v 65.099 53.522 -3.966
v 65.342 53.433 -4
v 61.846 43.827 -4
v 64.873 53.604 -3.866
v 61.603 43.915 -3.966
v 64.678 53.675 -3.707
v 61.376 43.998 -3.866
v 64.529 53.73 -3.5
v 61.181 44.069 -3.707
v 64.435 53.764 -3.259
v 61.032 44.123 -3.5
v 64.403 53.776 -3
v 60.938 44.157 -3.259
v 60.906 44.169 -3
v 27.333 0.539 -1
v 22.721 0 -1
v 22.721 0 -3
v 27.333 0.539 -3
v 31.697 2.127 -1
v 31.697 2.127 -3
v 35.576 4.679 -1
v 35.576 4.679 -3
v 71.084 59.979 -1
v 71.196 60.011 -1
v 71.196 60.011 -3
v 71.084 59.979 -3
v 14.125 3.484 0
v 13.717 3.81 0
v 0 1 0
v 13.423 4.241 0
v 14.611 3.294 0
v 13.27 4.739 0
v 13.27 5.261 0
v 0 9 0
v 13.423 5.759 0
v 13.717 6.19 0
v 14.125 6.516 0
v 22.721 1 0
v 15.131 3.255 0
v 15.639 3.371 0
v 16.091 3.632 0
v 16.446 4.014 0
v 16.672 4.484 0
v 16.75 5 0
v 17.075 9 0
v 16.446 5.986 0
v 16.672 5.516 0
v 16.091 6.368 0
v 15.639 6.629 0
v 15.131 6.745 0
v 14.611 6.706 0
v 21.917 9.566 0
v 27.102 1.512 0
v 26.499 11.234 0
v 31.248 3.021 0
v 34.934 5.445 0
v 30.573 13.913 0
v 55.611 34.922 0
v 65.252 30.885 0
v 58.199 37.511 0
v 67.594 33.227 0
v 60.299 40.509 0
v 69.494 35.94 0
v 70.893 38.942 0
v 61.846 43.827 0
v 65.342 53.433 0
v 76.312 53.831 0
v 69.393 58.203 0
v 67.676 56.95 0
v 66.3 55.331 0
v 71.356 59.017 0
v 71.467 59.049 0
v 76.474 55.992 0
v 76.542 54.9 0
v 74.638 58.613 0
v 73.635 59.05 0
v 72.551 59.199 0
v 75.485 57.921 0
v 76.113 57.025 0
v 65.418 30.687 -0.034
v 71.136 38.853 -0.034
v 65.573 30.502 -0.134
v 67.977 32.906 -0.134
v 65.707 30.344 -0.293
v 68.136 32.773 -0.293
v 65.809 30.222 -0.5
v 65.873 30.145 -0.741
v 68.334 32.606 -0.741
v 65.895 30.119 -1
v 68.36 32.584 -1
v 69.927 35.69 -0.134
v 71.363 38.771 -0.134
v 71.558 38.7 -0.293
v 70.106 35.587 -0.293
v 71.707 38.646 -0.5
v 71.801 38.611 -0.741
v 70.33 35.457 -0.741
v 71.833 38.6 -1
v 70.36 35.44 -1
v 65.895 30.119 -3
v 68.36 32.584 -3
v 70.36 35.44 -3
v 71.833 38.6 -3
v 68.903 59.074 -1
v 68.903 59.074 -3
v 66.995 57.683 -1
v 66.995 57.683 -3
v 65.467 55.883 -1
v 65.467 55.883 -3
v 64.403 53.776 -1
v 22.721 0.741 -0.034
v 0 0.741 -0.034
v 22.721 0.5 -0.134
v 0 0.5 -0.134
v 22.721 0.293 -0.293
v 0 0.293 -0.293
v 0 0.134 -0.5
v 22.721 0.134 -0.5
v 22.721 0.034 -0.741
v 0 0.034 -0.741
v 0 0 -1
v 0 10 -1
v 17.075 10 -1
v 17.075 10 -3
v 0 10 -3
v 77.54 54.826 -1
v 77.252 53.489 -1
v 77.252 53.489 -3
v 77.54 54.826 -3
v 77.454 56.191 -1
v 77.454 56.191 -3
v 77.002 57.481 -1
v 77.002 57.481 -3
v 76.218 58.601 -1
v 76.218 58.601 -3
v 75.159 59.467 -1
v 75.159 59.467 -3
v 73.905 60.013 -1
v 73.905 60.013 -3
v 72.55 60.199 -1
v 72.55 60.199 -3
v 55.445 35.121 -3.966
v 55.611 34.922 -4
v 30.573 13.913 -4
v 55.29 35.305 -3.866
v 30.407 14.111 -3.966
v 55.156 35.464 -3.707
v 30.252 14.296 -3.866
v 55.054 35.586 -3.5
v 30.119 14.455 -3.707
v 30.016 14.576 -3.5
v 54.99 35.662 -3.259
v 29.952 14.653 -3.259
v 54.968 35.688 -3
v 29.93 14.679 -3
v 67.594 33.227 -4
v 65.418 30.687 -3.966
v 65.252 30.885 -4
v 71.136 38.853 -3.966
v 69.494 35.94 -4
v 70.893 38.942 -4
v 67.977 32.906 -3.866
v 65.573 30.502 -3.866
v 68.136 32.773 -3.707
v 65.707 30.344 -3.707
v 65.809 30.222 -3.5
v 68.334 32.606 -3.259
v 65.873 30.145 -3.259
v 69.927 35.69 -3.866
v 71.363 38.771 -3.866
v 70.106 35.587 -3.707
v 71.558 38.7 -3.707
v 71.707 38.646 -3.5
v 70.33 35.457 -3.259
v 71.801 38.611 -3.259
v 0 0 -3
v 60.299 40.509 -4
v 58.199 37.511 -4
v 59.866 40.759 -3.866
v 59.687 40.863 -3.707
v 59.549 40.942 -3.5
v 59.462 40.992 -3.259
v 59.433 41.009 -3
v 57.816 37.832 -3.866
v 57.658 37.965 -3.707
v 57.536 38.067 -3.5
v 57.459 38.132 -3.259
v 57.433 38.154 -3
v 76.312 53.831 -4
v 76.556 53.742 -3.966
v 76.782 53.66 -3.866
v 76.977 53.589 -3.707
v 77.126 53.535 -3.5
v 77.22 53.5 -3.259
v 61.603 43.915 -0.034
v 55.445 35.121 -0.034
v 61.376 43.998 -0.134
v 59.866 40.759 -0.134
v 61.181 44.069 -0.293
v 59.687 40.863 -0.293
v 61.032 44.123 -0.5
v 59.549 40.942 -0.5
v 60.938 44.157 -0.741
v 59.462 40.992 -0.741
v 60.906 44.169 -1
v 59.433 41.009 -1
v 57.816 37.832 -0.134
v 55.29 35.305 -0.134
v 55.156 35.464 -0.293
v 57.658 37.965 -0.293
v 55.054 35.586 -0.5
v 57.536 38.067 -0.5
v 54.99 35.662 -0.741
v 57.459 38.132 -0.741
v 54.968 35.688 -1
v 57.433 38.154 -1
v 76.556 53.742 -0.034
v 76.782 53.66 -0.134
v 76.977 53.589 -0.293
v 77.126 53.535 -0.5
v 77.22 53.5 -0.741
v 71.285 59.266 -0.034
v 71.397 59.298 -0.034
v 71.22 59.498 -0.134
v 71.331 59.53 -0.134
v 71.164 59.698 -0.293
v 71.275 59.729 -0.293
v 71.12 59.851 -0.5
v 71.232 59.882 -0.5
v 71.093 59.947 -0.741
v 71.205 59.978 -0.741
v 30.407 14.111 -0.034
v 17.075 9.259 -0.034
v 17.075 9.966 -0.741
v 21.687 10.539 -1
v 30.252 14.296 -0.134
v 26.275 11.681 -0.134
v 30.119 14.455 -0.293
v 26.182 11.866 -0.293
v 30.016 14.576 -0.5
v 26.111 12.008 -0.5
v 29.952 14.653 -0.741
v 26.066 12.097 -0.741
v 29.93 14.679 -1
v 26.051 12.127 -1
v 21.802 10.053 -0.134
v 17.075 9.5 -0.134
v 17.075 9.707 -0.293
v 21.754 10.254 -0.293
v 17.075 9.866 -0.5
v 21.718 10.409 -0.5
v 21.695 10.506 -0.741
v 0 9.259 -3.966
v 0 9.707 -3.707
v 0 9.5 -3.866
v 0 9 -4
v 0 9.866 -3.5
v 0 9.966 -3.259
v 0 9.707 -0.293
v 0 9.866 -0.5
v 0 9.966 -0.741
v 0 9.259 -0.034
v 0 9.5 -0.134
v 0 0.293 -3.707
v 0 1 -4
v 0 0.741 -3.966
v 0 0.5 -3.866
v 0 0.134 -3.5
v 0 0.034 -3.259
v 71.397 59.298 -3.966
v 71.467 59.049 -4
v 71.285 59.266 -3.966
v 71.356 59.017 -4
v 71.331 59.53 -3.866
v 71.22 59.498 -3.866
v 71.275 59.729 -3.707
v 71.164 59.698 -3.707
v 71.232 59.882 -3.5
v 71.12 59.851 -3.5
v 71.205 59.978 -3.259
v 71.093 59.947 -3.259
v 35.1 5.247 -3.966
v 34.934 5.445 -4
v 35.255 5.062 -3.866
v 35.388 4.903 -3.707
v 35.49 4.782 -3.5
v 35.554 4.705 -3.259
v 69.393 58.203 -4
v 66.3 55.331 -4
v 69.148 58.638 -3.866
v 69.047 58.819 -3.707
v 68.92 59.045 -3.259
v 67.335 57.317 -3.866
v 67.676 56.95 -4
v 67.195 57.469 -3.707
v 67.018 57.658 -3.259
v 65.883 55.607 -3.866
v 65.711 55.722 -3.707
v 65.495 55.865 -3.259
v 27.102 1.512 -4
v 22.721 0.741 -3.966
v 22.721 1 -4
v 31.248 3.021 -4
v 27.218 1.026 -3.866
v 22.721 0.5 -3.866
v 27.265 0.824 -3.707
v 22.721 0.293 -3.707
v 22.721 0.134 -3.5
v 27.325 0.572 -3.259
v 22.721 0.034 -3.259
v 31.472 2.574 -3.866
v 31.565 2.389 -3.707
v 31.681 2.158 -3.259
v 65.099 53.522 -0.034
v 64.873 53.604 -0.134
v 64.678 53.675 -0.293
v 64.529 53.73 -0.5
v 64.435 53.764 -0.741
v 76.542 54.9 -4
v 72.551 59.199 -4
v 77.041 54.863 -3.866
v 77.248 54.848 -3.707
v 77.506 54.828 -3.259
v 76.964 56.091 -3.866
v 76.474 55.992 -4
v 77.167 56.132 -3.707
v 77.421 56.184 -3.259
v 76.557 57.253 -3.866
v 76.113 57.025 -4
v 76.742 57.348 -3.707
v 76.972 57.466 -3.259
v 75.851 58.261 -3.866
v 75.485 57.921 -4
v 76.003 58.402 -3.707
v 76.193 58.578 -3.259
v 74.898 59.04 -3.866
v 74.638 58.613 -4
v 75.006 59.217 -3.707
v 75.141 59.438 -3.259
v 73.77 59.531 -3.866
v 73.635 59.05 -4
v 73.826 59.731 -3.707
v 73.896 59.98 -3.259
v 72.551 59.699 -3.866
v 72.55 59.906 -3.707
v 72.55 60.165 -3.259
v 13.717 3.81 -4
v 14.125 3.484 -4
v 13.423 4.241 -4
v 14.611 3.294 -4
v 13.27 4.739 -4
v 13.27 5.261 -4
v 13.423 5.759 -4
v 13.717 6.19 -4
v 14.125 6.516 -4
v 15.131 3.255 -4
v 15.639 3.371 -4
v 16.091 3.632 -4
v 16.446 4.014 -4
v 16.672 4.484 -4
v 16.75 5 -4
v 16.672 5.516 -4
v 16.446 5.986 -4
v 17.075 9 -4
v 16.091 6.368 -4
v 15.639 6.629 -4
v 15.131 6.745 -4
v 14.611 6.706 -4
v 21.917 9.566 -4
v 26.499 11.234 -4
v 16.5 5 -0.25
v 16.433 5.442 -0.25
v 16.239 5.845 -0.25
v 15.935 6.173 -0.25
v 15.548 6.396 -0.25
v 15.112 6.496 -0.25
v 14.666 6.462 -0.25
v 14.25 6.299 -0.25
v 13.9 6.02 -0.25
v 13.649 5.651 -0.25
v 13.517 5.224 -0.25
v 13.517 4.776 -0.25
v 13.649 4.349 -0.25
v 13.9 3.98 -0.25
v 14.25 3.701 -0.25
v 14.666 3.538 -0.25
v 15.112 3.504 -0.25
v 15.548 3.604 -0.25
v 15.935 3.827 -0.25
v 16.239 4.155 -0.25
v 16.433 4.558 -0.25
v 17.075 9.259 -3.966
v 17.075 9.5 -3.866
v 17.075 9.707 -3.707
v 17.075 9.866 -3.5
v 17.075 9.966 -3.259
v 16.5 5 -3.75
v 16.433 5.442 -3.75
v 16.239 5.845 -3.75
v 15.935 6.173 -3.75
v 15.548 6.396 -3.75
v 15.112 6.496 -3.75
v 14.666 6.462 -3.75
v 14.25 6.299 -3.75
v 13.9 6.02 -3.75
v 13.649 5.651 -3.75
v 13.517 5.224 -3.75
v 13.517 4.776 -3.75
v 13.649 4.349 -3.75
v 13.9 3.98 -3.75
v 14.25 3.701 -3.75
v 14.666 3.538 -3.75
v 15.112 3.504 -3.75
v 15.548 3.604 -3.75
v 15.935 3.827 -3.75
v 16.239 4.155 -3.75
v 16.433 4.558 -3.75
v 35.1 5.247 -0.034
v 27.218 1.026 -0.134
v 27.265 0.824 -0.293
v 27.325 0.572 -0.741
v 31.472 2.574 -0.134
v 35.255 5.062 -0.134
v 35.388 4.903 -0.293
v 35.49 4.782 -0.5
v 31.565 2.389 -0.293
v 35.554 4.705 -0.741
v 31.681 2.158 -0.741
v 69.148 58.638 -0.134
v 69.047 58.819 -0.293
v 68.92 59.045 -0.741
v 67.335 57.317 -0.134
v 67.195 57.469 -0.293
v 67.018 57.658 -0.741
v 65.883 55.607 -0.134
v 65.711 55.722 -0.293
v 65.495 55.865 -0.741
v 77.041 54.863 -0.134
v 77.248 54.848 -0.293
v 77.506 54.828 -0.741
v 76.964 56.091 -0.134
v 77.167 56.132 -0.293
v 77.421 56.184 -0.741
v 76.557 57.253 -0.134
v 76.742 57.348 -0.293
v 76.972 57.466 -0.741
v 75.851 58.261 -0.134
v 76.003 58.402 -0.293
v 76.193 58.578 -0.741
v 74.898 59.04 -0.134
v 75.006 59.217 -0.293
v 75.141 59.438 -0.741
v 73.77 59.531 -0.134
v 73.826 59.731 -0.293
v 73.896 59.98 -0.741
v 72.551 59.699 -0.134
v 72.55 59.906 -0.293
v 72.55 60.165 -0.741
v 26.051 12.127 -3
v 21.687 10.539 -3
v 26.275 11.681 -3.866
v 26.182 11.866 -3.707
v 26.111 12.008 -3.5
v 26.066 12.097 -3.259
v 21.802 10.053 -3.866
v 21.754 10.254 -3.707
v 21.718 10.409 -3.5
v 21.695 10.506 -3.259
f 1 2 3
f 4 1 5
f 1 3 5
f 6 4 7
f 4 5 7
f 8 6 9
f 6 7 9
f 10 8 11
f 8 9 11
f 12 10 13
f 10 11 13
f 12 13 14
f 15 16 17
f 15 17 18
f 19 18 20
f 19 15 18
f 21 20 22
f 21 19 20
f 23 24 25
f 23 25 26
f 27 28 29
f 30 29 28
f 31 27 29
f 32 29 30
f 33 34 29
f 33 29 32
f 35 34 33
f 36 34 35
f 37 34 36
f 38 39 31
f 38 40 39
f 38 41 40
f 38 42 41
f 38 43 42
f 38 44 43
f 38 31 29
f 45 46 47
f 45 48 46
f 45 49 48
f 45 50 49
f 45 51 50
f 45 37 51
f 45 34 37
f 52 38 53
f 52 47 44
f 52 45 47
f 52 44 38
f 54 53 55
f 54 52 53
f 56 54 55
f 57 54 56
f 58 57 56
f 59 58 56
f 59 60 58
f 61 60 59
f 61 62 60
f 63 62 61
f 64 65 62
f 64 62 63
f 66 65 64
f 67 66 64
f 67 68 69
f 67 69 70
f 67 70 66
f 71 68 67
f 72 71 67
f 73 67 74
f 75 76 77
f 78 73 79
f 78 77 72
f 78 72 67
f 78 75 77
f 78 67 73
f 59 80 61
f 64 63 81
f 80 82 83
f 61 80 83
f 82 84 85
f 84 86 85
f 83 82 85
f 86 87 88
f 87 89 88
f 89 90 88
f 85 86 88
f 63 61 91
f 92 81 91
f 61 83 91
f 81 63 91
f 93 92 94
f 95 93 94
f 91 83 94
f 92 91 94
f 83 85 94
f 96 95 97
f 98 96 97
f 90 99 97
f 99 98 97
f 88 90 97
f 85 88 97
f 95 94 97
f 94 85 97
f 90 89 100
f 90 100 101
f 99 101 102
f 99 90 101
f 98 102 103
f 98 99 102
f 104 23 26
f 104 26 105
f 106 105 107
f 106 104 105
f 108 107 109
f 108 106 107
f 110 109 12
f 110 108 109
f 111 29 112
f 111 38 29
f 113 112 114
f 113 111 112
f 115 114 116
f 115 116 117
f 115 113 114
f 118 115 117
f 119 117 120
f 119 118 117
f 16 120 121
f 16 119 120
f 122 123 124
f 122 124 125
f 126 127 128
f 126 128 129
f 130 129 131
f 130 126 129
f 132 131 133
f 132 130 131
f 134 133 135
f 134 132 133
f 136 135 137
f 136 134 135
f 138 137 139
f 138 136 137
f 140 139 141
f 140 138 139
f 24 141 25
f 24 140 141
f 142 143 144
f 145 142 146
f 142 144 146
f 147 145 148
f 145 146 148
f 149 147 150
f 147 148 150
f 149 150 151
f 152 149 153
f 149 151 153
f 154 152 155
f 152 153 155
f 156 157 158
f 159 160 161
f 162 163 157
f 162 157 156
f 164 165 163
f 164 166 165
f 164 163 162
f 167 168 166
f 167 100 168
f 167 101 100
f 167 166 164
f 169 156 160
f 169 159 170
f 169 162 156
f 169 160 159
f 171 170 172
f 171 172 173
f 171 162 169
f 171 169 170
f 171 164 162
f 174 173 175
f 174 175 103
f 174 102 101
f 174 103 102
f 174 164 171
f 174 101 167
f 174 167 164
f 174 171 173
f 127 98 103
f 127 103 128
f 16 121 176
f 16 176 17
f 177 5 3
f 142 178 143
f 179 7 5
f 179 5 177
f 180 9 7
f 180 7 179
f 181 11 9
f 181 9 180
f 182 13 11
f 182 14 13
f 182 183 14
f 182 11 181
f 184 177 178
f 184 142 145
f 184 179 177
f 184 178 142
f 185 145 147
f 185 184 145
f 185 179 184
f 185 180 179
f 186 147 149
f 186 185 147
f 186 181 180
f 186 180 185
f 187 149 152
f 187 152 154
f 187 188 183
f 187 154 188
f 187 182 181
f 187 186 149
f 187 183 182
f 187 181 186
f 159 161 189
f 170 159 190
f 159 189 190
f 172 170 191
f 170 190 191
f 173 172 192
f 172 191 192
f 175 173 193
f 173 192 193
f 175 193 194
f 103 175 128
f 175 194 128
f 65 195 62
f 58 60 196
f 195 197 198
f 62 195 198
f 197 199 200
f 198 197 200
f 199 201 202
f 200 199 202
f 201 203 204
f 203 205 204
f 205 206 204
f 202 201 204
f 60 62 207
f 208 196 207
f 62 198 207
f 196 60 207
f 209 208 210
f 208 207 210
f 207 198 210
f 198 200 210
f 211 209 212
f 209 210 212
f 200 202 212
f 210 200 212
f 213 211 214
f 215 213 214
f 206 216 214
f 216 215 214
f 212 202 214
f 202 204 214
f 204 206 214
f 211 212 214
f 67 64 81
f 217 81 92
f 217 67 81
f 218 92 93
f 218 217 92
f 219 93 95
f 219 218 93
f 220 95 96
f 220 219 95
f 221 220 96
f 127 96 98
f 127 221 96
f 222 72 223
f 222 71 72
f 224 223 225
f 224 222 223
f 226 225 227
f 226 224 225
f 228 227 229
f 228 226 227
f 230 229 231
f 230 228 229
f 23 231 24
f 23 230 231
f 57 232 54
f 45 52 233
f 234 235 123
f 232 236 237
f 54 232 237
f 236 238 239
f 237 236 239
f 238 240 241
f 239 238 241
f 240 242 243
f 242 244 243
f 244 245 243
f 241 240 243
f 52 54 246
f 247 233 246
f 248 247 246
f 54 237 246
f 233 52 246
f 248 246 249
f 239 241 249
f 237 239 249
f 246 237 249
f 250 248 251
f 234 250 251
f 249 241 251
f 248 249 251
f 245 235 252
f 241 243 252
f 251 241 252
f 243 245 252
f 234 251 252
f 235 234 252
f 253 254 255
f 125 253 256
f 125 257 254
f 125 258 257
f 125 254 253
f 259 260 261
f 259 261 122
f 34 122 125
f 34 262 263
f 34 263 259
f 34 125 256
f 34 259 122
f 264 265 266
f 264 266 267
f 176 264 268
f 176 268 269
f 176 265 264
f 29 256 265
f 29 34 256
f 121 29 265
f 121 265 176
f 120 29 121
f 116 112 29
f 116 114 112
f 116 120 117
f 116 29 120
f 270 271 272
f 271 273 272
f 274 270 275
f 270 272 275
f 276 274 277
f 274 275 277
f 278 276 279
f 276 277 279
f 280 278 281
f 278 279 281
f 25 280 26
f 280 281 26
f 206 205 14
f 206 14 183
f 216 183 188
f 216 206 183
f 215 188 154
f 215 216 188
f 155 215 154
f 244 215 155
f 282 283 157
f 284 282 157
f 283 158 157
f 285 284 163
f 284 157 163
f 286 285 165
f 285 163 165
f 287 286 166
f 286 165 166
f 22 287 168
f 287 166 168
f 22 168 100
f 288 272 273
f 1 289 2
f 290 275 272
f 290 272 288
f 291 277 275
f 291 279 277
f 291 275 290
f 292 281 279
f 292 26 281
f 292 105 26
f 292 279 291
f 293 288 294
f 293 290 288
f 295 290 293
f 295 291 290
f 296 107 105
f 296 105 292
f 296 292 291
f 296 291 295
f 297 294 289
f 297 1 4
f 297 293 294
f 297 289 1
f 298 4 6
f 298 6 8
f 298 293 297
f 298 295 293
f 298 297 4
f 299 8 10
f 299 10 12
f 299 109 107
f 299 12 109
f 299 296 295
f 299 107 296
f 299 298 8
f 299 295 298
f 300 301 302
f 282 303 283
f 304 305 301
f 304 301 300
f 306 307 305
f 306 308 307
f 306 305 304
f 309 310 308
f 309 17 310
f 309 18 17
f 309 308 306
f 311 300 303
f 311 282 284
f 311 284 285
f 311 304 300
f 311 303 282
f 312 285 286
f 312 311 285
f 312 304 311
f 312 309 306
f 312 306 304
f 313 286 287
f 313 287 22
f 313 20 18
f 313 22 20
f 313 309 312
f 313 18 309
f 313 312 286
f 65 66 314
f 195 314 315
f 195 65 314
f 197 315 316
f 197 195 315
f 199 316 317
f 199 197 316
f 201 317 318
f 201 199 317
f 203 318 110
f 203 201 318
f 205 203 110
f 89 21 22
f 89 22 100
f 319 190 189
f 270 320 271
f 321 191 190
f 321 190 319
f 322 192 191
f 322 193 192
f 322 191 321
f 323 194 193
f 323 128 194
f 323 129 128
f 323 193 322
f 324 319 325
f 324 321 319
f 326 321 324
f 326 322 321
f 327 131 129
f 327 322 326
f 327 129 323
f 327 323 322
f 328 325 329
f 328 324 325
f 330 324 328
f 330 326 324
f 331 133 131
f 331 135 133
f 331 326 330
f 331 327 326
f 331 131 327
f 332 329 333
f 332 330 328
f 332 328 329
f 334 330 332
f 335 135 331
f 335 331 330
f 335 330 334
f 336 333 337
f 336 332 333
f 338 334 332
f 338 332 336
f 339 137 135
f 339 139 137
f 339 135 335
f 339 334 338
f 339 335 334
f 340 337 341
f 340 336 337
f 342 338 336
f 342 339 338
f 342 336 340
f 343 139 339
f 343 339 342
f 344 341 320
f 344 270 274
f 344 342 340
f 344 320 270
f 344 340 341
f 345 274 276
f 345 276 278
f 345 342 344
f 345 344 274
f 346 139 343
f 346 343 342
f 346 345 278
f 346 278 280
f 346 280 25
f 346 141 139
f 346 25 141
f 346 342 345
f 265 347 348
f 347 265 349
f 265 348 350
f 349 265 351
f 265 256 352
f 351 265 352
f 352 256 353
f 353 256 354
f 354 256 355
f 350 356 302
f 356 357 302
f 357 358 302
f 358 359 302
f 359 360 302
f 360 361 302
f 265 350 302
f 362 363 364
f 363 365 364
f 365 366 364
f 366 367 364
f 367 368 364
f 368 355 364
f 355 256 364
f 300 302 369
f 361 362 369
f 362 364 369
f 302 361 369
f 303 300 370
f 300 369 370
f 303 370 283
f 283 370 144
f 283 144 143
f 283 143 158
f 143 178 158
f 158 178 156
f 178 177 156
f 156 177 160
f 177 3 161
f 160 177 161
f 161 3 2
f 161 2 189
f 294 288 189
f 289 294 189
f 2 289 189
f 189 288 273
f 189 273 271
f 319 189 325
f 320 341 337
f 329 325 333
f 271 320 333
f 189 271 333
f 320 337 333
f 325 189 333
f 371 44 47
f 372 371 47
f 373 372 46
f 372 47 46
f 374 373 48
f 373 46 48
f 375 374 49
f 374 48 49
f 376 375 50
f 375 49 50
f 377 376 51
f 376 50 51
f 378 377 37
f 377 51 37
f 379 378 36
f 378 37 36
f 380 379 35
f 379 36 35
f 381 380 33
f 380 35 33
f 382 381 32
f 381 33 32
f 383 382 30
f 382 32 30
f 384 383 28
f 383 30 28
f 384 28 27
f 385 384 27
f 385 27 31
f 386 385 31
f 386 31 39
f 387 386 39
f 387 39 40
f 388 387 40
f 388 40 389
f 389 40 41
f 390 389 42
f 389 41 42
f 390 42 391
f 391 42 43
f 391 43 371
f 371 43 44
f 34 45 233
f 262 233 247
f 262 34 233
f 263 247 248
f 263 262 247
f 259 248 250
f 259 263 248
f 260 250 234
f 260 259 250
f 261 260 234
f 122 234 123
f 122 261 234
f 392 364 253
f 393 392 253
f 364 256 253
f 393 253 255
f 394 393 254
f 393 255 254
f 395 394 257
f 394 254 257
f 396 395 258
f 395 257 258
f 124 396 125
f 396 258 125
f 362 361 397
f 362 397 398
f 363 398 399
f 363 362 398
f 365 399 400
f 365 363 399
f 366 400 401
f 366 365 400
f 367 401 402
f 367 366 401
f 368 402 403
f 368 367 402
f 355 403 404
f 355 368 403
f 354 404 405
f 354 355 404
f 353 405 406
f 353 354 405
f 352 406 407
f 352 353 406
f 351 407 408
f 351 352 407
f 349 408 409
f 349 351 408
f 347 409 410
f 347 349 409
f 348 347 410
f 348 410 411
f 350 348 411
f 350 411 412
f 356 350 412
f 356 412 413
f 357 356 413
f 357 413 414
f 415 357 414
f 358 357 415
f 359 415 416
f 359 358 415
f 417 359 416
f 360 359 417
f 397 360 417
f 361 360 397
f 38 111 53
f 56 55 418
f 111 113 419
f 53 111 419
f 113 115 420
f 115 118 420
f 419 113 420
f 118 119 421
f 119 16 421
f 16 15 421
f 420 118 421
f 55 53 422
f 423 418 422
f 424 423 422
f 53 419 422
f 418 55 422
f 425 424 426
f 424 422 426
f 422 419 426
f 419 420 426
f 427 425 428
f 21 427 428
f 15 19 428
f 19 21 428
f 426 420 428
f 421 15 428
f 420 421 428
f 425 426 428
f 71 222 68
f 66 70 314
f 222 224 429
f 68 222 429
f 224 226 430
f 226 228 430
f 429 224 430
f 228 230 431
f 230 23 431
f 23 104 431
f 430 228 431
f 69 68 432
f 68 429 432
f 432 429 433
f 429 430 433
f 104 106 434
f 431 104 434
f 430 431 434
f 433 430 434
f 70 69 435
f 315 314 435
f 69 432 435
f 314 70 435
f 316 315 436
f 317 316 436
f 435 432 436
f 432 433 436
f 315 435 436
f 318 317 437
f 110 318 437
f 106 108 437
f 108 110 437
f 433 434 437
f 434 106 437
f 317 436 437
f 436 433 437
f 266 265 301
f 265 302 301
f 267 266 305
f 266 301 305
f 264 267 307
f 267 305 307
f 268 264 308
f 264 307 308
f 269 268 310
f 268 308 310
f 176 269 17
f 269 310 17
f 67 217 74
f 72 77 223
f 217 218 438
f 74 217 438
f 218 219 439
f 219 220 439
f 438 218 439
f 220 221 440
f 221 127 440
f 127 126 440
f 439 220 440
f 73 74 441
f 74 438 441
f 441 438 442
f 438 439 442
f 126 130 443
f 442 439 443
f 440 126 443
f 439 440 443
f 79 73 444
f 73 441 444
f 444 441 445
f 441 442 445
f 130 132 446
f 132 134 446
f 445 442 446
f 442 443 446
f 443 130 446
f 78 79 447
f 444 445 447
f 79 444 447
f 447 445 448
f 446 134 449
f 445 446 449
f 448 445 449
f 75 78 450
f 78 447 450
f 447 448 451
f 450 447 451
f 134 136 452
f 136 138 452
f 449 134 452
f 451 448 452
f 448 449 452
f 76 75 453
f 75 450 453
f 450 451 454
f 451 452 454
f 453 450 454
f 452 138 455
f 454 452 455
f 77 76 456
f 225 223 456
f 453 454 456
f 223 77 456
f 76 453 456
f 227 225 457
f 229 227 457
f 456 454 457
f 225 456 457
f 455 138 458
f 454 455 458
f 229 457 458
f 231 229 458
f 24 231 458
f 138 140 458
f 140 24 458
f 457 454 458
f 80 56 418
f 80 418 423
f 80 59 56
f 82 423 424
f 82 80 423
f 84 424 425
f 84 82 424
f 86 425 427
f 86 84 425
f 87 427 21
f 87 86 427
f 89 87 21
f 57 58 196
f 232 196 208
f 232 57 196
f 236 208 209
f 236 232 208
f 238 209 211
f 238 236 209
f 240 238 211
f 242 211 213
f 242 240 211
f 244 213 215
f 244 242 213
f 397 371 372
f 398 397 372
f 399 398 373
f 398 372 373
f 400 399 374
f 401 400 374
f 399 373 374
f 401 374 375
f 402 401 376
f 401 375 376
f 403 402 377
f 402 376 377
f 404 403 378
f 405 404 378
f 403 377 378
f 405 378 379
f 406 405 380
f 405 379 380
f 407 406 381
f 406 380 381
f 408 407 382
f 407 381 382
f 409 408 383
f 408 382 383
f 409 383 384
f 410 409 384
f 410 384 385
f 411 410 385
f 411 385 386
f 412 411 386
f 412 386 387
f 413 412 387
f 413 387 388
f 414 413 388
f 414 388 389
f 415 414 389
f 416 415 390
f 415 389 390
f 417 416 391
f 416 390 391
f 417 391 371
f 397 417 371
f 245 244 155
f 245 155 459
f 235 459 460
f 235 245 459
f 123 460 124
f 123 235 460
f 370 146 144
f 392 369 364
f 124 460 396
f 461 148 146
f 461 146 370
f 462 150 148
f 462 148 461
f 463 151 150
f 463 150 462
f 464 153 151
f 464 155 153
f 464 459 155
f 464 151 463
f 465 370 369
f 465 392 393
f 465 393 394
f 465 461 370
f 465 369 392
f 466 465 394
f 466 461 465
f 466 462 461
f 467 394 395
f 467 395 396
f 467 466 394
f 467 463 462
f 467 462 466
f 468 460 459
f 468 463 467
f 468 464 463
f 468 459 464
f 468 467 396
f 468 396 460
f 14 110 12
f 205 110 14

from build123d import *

# Parameters (mm, degrees)
SCHIZZO1_R                   = 1.5
ESTRUSIONE_ESTRUSIONE1_DEPTH = 4
SMUSSO1_SIZE                 = 0.25
RACCORDO4_R                  = 1
RACCORDO5_R                  = 1


with BuildPart() as part:
    # Schizzo1 → Estrusione-Estrusione1 (new body)
    with BuildSketch(Plane.XY):
        with BuildLine():
            Line((0, 0), (22.720595315, 0))
            ThreePointArc((22.720595315, 0), (29.560998181, 1.206147584), (35.576347508, 4.679111138))
            Line((35.576347508, 4.679111138), (65.894780202, 30.119296829))
            ThreePointArc((65.894780202, 30.119296829), (69.422068894, 33.968656964), (71.832880424, 38.599782825))
            Line((71.832880424, 38.599782825), (77.25204587, 53.48881752))
            ThreePointArc((77.25204587, 53.48881752), (76.217545127, 58.601179223), (71.195710383, 60.011005371))
            Line((71.195710383, 60.011005371), (71.083987609, 59.979479494))
            ThreePointArc((71.083987609, 59.979479494), (66.995210403, 57.683229946), (64.402806168, 53.775506658))
            Line((64.402806168, 53.775506658), (60.906270246, 44.168853168))
            ThreePointArc((60.906270246, 44.168853168), (58.495458716, 39.537727307), (54.968170024, 35.688367172))
            Line((54.968170024, 35.688367172), (29.930313668, 14.679111138))
            ThreePointArc((29.930313668, 14.679111138), (23.91496434, 11.206147584), (17.074561474, 10))
            Line((17.074561474, 10), (0, 10))
            Line((0, 10), (0, 0))
        make_face()
        with Locations((15, 5)):
            Circle(SCHIZZO1_R, mode=Mode.SUBTRACT)
    extrude(amount=-ESTRUSIONE_ESTRUSIONE1_DEPTH)

    # Smusso1
    smusso1_edges = [part.edges().sort_by_distance(p)[0] for p in [
        (13.5, 5, 0),
        (13.5, 5, -4),
    ]]
    chamfer(smusso1_edges, length=SMUSSO1_SIZE)

    # Raccordo4
    raccordo4_edges = [part.edges().sort_by_distance(p)[0] for p in [
        (74.542463147, 46.044300172, -4),
        (76.217545127, 58.601179223, -4),
        (71.139848996, 59.995242433, -4),
        (66.995210403, 57.683229946, -4),
        (62.654538207, 48.972179913, -4),
        (58.495458716, 39.537727307, -4),
        (42.449241846, 25.183739155, -4),
        (23.91496434, 11.206147584, -4),
        (8.537280737, 10, -4),
        (11.360297657, 0, -4),
        (29.560998181, 1.206147584, -4),
        (50.735563855, 17.399203983, -4),
        (69.422068894, 33.968656964, -4),
    ]]
    fillet(raccordo4_edges, radius=RACCORDO4_R)

    # Raccordo5
    raccordo5_edges = [part.edges().sort_by_distance(p)[0] for p in [
        (69.422068894, 33.968656964, 0),
        (50.735563855, 17.399203983, 0),
        (29.560998181, 1.206147584, 0),
        (11.360297657, 0, 0),
        (8.537280737, 10, 0),
        (23.91496434, 11.206147584, 0),
        (42.449241846, 25.183739155, 0),
        (58.495458716, 39.537727307, 0),
        (62.654538207, 48.972179913, 0),
        (66.995210403, 57.683229946, 0),
        (71.139848996, 59.995242433, 0),
        (76.217545127, 58.601179223, 0),
        (74.542463147, 46.044300172, 0),
    ]]
    fillet(raccordo5_edges, radius=RACCORDO5_R)


solid = part.part
